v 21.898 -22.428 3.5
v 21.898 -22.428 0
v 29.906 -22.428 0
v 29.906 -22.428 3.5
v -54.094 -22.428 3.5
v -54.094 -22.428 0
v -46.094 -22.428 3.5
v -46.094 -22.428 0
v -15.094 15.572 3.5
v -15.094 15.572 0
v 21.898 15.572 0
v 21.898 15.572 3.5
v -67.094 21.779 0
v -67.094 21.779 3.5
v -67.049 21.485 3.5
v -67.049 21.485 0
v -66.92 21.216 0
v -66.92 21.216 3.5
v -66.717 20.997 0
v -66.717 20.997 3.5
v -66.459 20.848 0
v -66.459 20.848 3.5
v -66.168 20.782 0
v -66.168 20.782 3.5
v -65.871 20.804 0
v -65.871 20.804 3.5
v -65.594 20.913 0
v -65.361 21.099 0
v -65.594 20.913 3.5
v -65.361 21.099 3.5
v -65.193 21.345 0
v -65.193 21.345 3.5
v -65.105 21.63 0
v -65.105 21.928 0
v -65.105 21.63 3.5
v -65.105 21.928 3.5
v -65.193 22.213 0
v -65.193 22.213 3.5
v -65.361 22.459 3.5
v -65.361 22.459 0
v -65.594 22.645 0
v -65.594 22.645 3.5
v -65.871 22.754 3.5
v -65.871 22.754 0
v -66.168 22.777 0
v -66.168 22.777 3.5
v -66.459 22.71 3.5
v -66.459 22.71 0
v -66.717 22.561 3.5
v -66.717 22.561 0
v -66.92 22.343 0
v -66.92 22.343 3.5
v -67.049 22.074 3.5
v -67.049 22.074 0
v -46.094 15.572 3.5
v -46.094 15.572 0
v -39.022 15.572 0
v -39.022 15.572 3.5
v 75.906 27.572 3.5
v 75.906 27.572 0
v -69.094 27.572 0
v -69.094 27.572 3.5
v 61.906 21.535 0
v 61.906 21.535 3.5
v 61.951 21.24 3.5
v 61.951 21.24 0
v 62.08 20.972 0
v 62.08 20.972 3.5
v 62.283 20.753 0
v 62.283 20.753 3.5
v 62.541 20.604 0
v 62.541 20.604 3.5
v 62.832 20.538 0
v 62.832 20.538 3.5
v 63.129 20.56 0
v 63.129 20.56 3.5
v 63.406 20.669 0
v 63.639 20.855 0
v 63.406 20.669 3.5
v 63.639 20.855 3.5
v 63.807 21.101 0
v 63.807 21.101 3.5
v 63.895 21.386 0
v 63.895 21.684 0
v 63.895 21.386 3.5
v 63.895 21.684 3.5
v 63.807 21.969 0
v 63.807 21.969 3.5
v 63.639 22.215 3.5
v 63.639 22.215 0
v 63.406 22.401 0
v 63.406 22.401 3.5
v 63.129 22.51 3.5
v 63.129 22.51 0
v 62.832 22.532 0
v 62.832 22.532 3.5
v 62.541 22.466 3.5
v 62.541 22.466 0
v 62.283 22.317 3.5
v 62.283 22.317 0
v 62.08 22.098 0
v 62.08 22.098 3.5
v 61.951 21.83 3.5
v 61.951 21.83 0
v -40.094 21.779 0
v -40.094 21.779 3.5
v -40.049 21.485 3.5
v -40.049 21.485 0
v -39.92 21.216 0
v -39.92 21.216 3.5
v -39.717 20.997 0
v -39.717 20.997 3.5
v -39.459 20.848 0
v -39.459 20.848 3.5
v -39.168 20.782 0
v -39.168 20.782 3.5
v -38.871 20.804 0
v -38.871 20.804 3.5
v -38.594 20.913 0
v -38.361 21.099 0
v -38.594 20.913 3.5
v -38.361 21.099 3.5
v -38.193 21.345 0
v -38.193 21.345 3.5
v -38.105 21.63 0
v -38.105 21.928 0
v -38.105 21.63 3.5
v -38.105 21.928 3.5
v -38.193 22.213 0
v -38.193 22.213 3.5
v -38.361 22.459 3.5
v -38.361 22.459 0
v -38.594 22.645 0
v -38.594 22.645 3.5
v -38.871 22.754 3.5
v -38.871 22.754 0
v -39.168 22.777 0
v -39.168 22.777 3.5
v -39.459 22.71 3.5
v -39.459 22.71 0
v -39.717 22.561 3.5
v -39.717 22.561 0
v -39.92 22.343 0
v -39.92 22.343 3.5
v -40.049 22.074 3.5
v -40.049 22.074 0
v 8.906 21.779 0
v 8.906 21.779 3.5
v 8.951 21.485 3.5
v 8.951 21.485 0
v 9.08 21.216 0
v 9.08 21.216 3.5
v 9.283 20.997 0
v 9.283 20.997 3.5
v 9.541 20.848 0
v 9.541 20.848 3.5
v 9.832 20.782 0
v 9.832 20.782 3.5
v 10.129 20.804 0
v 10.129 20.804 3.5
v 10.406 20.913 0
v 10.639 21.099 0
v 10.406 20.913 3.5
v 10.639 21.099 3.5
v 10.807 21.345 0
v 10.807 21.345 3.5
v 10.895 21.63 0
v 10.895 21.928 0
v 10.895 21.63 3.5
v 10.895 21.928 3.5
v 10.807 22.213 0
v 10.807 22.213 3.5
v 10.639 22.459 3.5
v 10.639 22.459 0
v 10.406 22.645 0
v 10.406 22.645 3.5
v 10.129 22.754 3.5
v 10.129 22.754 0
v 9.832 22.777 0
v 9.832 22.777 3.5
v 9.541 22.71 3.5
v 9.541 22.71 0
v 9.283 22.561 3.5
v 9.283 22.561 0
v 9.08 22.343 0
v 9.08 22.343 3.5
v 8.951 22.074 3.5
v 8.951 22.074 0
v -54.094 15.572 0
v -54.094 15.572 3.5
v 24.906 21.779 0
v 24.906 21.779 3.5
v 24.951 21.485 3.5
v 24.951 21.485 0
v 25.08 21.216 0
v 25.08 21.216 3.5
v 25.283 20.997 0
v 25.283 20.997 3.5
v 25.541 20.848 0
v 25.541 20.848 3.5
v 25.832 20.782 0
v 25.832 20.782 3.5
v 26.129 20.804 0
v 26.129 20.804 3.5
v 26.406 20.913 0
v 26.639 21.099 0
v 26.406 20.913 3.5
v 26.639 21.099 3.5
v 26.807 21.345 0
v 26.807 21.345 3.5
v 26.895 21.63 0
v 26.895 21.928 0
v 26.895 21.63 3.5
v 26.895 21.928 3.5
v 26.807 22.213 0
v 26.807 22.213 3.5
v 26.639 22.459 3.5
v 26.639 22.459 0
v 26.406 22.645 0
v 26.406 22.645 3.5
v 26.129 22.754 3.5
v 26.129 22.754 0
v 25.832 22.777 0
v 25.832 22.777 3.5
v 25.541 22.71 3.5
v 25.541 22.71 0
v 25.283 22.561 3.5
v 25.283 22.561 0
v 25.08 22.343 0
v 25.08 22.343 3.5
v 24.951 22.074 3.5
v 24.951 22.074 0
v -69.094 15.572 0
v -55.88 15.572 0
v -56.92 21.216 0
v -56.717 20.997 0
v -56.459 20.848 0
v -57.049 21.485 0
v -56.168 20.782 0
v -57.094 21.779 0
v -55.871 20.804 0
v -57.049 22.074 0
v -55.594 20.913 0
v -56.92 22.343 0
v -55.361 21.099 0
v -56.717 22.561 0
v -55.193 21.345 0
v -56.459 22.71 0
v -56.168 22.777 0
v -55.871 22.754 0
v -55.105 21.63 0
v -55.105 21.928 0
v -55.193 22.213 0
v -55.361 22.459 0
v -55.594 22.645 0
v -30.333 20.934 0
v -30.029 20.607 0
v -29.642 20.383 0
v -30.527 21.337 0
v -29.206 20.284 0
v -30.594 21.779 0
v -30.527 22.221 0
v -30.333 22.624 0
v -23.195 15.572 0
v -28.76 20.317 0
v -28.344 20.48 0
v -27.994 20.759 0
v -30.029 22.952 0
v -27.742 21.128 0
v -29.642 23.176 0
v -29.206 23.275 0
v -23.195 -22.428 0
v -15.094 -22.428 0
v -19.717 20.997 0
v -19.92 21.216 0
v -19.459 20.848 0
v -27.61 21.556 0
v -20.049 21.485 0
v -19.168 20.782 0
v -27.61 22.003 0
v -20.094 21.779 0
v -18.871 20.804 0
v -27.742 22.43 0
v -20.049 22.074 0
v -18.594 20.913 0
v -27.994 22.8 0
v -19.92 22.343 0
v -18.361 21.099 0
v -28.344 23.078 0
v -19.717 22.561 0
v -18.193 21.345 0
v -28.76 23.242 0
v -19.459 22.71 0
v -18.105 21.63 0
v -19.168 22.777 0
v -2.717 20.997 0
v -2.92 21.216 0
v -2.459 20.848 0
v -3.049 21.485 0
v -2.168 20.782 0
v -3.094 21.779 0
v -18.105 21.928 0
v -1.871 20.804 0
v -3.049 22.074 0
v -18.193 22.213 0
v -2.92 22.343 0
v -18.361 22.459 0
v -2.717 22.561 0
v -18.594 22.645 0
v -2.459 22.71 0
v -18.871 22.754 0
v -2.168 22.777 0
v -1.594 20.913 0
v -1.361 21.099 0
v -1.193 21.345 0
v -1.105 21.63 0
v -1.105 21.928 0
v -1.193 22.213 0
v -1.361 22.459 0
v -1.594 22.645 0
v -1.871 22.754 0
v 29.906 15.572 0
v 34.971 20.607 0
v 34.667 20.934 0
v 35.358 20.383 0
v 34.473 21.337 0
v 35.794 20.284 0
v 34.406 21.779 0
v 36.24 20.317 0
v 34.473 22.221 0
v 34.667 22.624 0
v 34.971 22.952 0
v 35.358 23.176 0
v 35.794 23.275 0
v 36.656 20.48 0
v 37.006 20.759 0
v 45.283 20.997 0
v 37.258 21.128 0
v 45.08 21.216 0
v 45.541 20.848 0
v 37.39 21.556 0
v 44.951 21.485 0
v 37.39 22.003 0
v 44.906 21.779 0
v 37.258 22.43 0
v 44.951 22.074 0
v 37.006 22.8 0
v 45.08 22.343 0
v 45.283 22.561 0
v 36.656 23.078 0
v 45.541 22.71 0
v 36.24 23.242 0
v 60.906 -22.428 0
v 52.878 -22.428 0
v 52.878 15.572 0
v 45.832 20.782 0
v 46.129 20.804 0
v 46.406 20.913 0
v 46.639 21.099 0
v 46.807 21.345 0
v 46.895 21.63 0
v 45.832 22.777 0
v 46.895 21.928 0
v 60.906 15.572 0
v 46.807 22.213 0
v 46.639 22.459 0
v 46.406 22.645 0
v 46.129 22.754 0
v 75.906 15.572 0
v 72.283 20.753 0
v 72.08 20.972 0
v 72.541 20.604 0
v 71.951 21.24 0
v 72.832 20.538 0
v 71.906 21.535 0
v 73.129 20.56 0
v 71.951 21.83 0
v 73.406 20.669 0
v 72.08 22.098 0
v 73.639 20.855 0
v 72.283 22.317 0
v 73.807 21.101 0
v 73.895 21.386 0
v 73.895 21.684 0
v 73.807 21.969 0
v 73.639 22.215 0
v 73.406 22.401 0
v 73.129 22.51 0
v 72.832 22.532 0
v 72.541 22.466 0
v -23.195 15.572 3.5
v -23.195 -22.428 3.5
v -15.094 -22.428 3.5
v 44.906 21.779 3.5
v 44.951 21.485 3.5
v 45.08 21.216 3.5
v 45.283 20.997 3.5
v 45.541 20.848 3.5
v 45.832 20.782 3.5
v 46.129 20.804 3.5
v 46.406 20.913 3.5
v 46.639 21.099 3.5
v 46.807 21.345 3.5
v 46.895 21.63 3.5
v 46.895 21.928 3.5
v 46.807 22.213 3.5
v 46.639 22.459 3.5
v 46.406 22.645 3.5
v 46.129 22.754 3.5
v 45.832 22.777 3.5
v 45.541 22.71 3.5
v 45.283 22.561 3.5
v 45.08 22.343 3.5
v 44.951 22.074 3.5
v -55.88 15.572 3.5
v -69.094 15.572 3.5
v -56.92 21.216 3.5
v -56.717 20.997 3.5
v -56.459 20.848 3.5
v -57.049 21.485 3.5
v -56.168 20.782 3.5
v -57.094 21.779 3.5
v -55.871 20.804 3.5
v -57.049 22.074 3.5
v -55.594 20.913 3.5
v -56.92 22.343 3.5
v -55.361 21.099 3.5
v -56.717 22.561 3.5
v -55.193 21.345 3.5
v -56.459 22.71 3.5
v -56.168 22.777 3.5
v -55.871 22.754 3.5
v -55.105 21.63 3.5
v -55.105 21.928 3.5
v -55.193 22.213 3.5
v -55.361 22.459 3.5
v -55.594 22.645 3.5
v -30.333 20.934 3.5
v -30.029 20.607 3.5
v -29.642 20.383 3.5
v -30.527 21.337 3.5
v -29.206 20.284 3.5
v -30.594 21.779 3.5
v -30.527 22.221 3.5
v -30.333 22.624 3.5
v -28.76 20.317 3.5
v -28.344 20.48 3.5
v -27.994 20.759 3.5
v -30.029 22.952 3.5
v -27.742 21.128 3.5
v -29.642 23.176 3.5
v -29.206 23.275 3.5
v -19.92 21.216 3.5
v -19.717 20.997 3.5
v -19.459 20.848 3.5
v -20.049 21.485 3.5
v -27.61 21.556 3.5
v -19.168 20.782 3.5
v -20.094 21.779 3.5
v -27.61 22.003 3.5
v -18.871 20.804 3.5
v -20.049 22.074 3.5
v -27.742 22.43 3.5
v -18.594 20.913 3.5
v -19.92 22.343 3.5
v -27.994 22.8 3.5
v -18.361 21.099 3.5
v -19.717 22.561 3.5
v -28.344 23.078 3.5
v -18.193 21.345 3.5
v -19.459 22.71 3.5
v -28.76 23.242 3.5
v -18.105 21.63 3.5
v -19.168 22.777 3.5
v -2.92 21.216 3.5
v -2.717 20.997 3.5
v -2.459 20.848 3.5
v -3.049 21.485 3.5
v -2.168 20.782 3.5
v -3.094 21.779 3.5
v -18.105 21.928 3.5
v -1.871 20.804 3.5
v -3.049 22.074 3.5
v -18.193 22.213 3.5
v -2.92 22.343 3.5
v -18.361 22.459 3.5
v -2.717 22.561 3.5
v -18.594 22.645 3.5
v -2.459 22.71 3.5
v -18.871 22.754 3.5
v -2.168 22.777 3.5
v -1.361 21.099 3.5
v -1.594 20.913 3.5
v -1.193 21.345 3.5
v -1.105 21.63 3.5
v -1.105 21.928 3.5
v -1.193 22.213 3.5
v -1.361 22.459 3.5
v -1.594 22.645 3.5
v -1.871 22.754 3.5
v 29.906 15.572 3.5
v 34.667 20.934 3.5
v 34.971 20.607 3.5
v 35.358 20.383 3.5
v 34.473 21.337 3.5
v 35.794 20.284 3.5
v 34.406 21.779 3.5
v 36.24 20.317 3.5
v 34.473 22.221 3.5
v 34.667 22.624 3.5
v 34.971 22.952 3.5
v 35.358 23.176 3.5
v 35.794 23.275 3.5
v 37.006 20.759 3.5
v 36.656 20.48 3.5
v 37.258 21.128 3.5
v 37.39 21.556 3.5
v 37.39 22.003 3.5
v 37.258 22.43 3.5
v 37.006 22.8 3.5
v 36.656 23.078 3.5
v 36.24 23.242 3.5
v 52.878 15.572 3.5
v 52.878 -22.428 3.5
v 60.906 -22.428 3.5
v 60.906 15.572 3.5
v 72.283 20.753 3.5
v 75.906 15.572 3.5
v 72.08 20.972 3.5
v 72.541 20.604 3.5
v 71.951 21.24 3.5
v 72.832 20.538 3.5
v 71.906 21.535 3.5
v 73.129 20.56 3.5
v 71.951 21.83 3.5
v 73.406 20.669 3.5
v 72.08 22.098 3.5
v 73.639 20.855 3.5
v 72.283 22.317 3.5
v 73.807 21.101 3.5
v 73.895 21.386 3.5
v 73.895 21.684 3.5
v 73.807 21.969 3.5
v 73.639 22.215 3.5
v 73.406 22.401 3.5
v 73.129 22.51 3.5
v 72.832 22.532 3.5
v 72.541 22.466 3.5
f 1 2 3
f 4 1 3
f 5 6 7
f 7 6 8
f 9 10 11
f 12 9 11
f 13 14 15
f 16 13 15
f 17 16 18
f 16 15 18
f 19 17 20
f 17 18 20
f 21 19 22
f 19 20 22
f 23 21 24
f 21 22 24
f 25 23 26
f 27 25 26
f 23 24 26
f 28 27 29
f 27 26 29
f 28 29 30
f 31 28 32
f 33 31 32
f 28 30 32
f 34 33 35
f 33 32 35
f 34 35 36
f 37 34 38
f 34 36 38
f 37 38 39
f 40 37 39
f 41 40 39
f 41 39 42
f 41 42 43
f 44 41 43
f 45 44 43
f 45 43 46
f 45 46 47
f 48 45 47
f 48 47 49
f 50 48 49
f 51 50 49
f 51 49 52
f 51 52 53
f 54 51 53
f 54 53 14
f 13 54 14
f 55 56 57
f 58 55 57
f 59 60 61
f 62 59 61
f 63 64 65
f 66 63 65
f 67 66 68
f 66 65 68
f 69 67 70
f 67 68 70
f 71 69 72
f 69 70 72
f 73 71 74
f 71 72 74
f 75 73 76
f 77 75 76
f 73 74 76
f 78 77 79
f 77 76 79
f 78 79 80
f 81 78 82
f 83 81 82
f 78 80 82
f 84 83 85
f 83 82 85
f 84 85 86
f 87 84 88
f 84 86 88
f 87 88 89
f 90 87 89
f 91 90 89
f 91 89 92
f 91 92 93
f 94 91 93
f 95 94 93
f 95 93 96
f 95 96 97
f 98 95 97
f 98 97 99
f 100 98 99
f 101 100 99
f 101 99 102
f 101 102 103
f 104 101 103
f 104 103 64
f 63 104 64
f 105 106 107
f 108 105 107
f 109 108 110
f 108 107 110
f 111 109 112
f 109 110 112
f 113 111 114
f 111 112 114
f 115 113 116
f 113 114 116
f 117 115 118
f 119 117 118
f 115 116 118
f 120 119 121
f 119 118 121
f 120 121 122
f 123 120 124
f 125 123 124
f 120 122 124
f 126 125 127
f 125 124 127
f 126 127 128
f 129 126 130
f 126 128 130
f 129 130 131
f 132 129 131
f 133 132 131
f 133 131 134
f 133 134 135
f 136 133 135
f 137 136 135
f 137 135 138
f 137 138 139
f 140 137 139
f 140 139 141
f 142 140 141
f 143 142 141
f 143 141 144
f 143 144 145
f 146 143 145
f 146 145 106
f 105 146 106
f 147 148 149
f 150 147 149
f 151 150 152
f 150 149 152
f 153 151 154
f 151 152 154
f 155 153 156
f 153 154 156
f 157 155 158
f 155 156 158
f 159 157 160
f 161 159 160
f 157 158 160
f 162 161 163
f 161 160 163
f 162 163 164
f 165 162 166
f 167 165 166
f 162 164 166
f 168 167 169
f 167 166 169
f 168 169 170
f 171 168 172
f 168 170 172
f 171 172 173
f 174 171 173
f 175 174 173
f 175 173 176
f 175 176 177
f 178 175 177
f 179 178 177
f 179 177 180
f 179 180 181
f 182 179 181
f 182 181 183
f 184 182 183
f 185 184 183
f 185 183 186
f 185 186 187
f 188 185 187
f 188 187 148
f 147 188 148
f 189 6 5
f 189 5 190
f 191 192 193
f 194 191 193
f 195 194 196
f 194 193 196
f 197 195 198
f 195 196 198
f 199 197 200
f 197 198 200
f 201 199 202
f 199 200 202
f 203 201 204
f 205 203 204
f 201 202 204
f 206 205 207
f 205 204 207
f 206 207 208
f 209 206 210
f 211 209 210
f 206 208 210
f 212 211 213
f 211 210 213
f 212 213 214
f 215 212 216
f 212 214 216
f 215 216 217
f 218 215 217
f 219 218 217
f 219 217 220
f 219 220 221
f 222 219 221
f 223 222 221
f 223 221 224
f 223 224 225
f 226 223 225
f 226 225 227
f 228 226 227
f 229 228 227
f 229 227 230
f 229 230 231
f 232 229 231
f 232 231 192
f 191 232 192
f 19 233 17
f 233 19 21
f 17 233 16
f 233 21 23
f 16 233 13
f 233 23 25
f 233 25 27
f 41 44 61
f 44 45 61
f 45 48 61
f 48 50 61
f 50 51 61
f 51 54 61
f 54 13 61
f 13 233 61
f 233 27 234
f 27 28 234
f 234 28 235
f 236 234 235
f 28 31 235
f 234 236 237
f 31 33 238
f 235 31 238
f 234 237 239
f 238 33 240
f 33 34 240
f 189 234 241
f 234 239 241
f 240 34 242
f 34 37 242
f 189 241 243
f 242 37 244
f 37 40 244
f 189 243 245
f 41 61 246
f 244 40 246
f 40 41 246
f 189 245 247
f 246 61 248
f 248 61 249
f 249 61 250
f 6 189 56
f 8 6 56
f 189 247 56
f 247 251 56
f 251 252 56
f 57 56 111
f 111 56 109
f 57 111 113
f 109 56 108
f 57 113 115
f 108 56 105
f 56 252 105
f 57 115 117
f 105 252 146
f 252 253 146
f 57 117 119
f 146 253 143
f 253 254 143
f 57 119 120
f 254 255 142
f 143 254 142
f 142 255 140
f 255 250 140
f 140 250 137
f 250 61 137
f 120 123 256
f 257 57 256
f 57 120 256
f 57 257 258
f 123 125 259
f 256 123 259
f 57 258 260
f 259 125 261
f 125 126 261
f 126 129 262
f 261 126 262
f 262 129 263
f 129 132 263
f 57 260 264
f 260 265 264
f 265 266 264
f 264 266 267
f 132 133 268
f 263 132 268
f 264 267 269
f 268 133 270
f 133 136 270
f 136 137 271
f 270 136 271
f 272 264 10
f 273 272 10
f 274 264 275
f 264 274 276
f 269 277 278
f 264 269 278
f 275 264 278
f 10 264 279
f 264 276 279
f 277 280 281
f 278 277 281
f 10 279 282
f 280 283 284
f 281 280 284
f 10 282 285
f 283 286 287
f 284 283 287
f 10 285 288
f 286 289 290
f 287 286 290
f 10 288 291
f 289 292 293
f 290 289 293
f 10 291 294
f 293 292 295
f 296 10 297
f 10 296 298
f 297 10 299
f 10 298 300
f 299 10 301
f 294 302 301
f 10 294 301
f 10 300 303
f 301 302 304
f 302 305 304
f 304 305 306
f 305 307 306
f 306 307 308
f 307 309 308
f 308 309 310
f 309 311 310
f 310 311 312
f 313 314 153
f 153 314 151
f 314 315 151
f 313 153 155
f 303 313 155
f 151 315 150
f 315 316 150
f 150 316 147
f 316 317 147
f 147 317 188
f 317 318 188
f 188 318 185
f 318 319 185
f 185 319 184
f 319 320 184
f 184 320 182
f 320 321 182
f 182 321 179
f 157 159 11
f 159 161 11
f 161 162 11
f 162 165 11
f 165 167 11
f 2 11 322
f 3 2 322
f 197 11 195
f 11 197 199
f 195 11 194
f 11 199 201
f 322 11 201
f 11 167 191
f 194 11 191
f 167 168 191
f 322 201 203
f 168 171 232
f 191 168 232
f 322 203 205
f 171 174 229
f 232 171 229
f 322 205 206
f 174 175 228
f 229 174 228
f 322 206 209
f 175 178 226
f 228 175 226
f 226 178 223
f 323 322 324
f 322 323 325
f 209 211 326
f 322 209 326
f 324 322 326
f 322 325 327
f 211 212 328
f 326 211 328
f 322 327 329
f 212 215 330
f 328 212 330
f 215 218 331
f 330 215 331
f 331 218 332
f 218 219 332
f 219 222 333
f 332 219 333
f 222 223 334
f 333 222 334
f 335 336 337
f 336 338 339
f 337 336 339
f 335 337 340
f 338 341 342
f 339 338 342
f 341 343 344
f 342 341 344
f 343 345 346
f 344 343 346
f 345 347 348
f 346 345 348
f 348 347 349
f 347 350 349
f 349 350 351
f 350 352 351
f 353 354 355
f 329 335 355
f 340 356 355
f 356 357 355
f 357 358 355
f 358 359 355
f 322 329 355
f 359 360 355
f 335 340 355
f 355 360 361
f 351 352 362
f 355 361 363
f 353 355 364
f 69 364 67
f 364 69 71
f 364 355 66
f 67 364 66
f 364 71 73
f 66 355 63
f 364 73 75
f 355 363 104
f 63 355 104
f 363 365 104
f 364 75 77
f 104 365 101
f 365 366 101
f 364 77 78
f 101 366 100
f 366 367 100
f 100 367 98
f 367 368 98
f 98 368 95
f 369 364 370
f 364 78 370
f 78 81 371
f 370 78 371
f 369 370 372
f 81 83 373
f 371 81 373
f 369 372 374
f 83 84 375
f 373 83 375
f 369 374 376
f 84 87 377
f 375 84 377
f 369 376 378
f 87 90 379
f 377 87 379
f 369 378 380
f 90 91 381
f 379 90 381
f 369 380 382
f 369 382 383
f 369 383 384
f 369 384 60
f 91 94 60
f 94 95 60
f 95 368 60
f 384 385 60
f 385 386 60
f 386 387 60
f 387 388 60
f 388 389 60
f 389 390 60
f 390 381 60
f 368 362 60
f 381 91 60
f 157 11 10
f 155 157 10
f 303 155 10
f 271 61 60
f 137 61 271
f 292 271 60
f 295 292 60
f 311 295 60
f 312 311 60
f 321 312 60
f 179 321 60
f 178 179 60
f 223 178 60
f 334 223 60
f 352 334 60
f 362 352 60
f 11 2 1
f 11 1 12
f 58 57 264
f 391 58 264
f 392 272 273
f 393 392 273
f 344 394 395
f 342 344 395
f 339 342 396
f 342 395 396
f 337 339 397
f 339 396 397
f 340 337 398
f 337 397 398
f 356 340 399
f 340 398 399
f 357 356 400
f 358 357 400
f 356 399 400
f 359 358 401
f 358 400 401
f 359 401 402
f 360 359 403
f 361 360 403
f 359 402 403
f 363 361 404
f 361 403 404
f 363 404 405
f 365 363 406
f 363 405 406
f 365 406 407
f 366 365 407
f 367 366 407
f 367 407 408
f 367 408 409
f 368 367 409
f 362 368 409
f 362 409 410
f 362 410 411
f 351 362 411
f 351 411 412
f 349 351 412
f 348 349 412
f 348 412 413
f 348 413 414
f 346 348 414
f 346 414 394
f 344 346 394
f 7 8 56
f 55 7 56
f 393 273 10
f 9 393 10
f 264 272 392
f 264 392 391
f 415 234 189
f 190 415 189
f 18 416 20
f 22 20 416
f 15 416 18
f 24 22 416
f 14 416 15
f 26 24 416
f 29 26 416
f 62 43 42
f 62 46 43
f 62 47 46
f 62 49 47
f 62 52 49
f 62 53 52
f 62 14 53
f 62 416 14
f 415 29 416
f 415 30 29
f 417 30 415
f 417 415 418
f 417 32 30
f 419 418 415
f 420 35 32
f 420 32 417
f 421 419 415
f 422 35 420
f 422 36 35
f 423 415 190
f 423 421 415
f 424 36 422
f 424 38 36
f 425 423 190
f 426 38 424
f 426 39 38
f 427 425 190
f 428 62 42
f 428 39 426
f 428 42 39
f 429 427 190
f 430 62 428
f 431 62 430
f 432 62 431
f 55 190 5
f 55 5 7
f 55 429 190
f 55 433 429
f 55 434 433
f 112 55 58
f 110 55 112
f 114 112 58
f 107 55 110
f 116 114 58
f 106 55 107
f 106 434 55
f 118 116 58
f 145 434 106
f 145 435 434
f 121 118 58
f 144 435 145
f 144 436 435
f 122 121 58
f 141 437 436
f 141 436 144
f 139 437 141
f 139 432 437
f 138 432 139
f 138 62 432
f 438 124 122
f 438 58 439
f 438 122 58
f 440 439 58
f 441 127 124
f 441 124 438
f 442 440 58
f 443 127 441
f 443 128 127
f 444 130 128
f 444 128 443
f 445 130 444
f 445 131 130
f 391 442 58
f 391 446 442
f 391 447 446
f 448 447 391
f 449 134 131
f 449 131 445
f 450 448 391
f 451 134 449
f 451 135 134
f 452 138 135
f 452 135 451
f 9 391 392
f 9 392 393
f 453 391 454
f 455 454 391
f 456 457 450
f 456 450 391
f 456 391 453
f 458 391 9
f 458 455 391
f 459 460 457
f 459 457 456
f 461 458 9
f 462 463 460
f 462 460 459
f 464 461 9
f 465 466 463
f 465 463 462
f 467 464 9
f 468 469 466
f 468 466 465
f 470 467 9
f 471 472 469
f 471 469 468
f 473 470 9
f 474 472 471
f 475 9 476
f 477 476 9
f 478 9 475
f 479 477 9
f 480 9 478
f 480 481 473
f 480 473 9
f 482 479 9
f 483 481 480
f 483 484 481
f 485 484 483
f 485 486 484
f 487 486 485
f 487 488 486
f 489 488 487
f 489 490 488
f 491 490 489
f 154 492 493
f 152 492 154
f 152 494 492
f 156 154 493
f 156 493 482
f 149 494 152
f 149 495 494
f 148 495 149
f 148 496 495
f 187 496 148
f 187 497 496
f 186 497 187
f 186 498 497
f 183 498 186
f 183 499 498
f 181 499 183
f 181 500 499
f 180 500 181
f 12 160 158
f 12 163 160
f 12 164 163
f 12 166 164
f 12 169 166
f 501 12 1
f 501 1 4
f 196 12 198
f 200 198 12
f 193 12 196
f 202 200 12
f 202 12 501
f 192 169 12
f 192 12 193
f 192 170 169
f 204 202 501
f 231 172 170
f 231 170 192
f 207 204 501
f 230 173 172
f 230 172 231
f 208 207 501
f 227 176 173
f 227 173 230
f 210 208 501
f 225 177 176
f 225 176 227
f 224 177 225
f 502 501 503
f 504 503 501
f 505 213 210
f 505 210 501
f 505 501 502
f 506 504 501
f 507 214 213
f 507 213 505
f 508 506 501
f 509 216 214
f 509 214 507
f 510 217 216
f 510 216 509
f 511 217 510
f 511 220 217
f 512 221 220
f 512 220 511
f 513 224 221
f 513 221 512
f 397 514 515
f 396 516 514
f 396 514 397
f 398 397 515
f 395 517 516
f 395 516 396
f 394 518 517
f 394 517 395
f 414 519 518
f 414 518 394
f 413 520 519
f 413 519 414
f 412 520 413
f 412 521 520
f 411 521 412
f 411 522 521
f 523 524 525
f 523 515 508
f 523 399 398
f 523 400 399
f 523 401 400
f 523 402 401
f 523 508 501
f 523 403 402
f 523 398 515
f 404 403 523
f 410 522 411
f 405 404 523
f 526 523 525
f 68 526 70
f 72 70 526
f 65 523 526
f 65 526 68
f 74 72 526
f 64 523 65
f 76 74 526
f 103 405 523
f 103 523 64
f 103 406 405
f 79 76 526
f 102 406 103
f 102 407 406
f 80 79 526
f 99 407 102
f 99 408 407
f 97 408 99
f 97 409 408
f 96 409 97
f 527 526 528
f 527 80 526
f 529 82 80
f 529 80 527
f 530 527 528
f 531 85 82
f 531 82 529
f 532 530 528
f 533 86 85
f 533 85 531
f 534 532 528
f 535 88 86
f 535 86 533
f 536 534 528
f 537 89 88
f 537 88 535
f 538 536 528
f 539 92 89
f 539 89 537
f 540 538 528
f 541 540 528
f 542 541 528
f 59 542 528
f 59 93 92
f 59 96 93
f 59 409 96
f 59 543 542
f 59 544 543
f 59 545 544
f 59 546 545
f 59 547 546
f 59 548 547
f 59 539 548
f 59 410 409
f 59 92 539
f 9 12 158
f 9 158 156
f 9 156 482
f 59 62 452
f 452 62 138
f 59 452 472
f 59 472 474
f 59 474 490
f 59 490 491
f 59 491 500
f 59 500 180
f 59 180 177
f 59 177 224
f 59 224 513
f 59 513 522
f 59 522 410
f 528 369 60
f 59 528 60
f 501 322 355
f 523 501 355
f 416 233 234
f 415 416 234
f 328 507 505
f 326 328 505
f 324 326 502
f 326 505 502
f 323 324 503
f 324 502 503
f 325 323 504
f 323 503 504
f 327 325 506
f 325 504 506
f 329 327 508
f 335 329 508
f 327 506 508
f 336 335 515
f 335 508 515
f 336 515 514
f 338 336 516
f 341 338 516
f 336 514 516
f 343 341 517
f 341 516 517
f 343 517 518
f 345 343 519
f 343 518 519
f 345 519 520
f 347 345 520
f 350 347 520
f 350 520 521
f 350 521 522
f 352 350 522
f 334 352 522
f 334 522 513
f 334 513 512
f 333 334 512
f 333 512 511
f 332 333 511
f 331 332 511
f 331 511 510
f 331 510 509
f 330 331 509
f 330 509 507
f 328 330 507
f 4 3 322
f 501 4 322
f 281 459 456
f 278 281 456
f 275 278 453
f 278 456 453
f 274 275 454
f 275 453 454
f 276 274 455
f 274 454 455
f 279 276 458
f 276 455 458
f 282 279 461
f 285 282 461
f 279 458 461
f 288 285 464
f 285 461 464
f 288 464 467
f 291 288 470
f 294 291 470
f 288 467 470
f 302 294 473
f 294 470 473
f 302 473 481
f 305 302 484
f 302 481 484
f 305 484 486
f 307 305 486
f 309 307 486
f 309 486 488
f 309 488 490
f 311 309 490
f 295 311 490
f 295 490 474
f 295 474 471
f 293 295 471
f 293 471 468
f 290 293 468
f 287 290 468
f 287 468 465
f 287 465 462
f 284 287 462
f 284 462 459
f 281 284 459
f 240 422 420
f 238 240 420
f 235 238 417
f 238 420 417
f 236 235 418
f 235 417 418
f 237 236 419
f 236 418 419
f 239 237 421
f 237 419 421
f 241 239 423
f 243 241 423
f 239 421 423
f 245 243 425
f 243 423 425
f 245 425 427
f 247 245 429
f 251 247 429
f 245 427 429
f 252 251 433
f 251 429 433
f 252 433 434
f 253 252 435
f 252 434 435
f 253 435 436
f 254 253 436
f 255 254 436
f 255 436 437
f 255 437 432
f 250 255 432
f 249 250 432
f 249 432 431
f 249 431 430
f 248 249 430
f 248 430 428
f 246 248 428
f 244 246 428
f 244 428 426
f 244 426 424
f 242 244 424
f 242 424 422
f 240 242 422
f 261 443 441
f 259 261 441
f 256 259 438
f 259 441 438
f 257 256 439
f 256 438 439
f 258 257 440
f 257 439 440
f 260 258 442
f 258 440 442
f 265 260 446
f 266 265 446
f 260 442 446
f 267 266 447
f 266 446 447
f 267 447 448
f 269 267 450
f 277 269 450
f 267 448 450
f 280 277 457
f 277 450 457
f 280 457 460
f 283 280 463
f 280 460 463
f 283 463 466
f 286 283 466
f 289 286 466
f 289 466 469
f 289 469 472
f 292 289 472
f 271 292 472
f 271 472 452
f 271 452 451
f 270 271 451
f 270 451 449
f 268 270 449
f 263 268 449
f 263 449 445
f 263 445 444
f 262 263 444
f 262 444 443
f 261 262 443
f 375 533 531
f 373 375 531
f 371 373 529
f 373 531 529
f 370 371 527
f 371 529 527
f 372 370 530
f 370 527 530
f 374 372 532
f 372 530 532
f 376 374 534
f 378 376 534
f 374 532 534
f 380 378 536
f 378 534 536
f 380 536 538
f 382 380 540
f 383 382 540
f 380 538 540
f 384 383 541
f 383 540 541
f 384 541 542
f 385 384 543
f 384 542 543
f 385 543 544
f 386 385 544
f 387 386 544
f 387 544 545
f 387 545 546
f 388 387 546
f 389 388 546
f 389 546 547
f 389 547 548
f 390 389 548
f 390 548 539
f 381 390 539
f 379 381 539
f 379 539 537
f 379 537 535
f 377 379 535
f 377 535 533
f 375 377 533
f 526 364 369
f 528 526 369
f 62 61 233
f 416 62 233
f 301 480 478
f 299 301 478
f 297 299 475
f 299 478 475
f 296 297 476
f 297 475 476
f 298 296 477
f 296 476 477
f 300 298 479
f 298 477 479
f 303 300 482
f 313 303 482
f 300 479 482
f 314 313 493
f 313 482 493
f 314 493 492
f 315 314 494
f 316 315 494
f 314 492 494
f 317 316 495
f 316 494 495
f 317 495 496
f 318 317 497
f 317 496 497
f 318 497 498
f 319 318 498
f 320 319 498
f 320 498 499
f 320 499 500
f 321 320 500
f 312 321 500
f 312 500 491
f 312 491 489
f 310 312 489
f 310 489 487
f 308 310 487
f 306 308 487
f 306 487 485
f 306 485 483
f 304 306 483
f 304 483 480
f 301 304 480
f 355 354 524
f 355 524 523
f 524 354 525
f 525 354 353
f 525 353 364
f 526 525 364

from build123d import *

# Parameters (mm, degrees)
F0_W     = 2.9513968527
F0_H     = 5.7922647223
F0_W_2   = 10.2618969977
F0_H_2   = 6.2077352777
F0_W_3   = 16.8588273227
F0_W_4   = 37.1382929152
F0_W_5   = 8
F0_H_3   = 38
F0_W_6   = 8.1014430672
F0_W_7   = 8.0087523311
F0_W_8   = 8.027805835
F1_DEPTH = 3.5
F2_D     = 2
F3_D     = 3


# Not quite as in the source:
# - a feature names something its author has since deleted; it is built from what else it names


with BuildPart() as f1:
    # F0 (on Top) → F1 (new body)
    with BuildSketch(Plane.XY):
        with Locations((-67.6180190593, 24.675444182)):
            Rectangle(F0_W, F0_H)
        with Locations((-61.0113721341, 24.675444182)):
            Rectangle(F0_W_2, F0_H)
        with Locations((-67.6180190593, 18.675444182)):
            Rectangle(F0_W, F0_H_2)
        with Locations((-47.4510099739, 24.675444182)):
            Rectangle(F0_W_3, F0_H)
        with Locations((-61.0113721341, 18.675444182)):
            Rectangle(F0_W_2, F0_H_2)
        with Locations((-20.4524498549, 24.675444182)):
            Rectangle(F0_W_4, F0_H)
        Polygon((-39.0215963125, 21.7793118209), (-55.8804236352, 21.7793118209), (-55.8804236352, 15.5715765432), (-54.0937174857, 15.5715765432), (-46.0937174857, 15.5715765432), (-39.0215963125, 15.5715765432), align=None)
        Polygon((9.8445750773, 27.5715765432), (-1.8833033973, 27.5715765432), (-1.8833033973, 21.7793118209), (9.8743605615, 21.7793118209), align=None)
        Polygon((-1.8833033973, 21.7793118209), (-39.0215963125, 21.7793118209), (-39.0215963125, 15.5715765432), (-23.1951605529, 15.5715765432), (-15.0937174857, 15.5715765432), (-1.8833033973, 15.5715765432), align=None)
        Polygon((62.8643706441, 27.5715765432), (9.8445750773, 27.5715765432), (9.8743605615, 21.7793118209), (62.8643706441, 21.7793118209), align=None)
        Polygon((9.8743605615, 21.7793118209), (-1.8833033973, 21.7793118209), (-1.8833033973, 15.5715765432), (9.9062825143, 15.5715765432), align=None)
        with Locations((-50.0937174857, -3.4284234568)):
            Rectangle(F0_W_5, F0_H_3)
        Polygon((72.6376026869, 27.5715765432), (62.8643706441, 27.5715765432), (62.8643706441, 21.7793118209), (72.7672914107, 21.7793118209), align=None)
        Polygon((62.8643706441, 21.7793118209), (9.8743605615, 21.7793118209), (9.9062825143, 15.5715765432), (21.8975301832, 15.5715765432), (29.9062825143, 15.5715765432), (52.8784766793, 15.5715765432), (60.9062825143, 15.5715765432), (62.8643706441, 15.5715765432), align=None)
        with Locations((-19.1444390193, -3.4284234568)):
            Rectangle(F0_W_6, F0_H_3)
        Polygon((75.9062825143, 27.5715765432), (72.6376026869, 27.5715765432), (72.7672914107, 21.7793118209), (75.9062825143, 21.7793118209), align=None)
        Polygon((72.7672914107, 21.7793118209), (62.8643706441, 21.7793118209), (62.8643706441, 15.5715765432), (72.9062825143, 15.5715765432), align=None)
        Polygon((75.9062825143, 21.7793118209), (72.7672914107, 21.7793118209), (72.9062825143, 15.5715765432), (75.9062825143, 15.5715765432), align=None)
        with Locations((25.9019063488, -3.4284234568)):
            Rectangle(F0_W_7, F0_H_3)
        with Locations((56.8923795968, -3.4284234568)):
            Rectangle(F0_W_8, F0_H_3)
    extrude(amount=F1_DEPTH)

    # F2 (through all)
    with Locations(Plane(origin=(0, 0, 0), x_dir=(1, 0, 0), z_dir=(0, 0, -1))):
        with Locations((-66.0937174857, -21.7793118209), (-56.0937174857, -21.7793118209), (-39.0937174857, -21.7793118209), (-19.0937174857, -21.7793118209), (-2.0937174857, -21.7793118209), (9.9062825143, -21.7793118209), (25.9062825143, -21.7793118209), (45.9062825143, -21.7793118209), (62.9062825143, -21.5349812061), (72.9062825143, -21.5349812061)):
            Hole(F2_D / 2)

    # F3 (through all)
    with Locations(Plane(origin=(0, 0, 0), x_dir=(1, 0, 0), z_dir=(0, 0, -1))):
        with Locations((-29.0937174857, -21.7793118209), (35.9062825143, -21.7793118209)):
            Hole(F3_D / 2)


solid = f1.part
